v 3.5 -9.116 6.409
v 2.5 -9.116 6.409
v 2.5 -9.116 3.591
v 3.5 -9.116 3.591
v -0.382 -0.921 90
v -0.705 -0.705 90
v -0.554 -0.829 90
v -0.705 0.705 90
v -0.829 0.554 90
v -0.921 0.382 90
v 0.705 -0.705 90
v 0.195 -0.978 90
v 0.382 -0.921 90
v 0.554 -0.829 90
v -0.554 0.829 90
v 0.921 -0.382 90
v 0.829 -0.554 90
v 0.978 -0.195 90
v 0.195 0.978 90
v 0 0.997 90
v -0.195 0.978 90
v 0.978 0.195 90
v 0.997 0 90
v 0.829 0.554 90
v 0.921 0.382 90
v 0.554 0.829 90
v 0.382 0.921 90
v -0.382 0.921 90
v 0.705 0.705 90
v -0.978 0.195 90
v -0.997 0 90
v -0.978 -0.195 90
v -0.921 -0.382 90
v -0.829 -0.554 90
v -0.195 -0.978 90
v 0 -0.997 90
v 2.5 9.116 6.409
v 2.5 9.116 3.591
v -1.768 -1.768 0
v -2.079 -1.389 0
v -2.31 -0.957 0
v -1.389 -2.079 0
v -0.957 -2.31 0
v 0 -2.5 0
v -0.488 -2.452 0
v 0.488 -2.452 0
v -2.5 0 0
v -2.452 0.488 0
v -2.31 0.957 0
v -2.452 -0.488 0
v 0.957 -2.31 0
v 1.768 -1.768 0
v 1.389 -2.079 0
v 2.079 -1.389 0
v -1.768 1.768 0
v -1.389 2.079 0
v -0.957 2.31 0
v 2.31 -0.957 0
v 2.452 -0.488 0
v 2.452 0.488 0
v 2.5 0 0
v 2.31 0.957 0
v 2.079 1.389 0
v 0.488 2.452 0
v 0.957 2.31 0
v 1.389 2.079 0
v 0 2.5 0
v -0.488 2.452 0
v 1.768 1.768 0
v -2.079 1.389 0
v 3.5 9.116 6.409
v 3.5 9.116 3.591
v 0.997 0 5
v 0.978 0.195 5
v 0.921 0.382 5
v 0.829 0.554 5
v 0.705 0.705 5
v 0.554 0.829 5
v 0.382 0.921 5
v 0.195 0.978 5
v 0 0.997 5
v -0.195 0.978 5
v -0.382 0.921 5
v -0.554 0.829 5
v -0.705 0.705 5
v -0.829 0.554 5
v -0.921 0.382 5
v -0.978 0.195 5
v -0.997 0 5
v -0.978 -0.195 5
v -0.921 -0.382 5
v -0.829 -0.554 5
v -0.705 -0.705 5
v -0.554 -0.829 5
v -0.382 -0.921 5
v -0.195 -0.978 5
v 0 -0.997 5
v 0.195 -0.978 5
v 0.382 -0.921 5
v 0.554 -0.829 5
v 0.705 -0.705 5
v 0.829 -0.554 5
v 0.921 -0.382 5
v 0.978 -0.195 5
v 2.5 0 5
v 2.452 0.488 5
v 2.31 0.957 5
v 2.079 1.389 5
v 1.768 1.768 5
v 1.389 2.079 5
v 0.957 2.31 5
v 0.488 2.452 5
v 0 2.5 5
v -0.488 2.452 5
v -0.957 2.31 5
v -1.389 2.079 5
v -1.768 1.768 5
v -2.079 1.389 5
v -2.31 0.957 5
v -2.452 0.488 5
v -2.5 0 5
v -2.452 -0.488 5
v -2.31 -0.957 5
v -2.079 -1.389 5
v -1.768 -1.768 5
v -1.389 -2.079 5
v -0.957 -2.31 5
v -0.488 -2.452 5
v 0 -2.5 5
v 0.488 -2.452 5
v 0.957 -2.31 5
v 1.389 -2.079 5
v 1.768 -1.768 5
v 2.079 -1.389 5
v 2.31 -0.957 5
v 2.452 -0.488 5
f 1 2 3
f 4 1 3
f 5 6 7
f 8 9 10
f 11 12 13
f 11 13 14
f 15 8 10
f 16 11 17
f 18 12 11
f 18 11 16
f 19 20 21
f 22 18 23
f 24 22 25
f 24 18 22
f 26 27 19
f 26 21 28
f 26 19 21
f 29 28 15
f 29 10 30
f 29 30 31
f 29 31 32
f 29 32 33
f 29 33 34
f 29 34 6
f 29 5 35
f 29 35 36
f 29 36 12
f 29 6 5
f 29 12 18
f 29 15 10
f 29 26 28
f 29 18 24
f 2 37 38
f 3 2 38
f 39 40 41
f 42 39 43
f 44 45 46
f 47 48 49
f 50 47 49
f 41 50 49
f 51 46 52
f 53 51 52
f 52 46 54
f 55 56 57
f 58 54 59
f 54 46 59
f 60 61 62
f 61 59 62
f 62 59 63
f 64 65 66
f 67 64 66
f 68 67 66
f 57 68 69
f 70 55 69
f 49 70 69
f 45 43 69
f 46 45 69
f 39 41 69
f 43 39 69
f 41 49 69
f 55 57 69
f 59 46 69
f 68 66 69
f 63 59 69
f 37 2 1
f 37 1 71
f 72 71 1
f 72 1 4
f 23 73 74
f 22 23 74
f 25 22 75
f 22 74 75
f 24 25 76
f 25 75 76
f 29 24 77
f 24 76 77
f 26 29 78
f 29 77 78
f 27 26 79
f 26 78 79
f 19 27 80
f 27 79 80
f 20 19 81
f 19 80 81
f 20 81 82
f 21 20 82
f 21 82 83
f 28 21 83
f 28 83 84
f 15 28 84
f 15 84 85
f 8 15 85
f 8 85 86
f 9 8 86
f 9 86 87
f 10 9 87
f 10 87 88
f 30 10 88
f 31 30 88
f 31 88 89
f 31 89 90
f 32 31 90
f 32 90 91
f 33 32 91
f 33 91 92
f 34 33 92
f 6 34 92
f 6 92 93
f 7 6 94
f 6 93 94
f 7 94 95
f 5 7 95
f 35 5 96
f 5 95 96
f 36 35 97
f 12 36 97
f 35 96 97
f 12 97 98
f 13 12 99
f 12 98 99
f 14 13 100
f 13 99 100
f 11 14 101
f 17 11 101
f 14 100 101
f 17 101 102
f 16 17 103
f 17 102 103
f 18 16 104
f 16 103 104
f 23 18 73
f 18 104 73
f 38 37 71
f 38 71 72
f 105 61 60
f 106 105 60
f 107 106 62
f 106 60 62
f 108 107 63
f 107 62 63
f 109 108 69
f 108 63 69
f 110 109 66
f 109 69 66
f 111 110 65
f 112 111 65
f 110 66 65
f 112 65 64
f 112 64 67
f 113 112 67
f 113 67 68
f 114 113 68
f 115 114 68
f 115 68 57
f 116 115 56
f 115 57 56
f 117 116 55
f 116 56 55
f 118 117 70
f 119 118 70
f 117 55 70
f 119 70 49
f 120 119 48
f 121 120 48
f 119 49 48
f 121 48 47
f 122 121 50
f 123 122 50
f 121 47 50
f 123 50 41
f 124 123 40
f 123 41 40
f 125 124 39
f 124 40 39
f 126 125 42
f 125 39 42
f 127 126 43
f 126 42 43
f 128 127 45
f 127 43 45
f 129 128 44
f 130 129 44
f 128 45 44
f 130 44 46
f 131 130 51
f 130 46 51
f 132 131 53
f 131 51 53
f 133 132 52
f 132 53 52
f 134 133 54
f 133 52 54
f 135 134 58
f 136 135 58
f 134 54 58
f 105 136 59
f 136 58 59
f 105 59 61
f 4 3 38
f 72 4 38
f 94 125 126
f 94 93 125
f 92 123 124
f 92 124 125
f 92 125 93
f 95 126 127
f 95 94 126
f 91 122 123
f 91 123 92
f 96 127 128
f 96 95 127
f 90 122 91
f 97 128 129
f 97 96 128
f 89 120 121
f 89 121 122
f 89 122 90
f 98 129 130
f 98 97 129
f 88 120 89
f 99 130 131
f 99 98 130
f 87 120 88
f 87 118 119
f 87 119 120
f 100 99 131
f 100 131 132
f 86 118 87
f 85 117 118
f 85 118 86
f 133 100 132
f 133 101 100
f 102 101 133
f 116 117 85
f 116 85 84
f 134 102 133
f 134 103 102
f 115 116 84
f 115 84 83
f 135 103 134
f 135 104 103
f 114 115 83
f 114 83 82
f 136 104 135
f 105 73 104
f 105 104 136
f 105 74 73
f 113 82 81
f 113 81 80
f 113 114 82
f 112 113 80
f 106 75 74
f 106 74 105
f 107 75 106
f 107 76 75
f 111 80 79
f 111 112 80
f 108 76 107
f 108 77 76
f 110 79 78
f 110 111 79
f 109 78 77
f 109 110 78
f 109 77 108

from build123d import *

# Parameters (mm, degrees)
ESQUISSE1_R        = 2.5
BOSS_EXTRU_1_DEPTH = 5
ESQUISSE2_R        = 0.997360315
BOSS_EXTRU_2_DEPTH = 90
ESQUISSE3_W        = 2.818851666
ESQUISSE3_H        = 18.231891376
BOSS_EXTRU_3_DEPTH = 1


with BuildPart() as part:
    # Esquisse1 → Boss.-Extru.1 (new body)
    with BuildSketch(Plane.XY):
        Circle(ESQUISSE1_R)
    extrude(amount=BOSS_EXTRU_1_DEPTH)

    # Esquisse2 → Boss.-Extru.2 (add)
    with BuildSketch(Plane.XY):
        Circle(ESQUISSE2_R)
    extrude(amount=BOSS_EXTRU_2_DEPTH)


with BuildPart() as body_2:
    # Esquisse3 → Boss.-Extru.3 (new body)
    with BuildSketch(Plane(origin=(2.5, 0, 0), x_dir=(0, 0, -1), z_dir=(1, 0, 0))):
        with Locations((-5, 0)):
            Rectangle(ESQUISSE3_W, ESQUISSE3_H)
    extrude(amount=BOSS_EXTRU_3_DEPTH)


solid = Compound([part.part, body_2.part])
